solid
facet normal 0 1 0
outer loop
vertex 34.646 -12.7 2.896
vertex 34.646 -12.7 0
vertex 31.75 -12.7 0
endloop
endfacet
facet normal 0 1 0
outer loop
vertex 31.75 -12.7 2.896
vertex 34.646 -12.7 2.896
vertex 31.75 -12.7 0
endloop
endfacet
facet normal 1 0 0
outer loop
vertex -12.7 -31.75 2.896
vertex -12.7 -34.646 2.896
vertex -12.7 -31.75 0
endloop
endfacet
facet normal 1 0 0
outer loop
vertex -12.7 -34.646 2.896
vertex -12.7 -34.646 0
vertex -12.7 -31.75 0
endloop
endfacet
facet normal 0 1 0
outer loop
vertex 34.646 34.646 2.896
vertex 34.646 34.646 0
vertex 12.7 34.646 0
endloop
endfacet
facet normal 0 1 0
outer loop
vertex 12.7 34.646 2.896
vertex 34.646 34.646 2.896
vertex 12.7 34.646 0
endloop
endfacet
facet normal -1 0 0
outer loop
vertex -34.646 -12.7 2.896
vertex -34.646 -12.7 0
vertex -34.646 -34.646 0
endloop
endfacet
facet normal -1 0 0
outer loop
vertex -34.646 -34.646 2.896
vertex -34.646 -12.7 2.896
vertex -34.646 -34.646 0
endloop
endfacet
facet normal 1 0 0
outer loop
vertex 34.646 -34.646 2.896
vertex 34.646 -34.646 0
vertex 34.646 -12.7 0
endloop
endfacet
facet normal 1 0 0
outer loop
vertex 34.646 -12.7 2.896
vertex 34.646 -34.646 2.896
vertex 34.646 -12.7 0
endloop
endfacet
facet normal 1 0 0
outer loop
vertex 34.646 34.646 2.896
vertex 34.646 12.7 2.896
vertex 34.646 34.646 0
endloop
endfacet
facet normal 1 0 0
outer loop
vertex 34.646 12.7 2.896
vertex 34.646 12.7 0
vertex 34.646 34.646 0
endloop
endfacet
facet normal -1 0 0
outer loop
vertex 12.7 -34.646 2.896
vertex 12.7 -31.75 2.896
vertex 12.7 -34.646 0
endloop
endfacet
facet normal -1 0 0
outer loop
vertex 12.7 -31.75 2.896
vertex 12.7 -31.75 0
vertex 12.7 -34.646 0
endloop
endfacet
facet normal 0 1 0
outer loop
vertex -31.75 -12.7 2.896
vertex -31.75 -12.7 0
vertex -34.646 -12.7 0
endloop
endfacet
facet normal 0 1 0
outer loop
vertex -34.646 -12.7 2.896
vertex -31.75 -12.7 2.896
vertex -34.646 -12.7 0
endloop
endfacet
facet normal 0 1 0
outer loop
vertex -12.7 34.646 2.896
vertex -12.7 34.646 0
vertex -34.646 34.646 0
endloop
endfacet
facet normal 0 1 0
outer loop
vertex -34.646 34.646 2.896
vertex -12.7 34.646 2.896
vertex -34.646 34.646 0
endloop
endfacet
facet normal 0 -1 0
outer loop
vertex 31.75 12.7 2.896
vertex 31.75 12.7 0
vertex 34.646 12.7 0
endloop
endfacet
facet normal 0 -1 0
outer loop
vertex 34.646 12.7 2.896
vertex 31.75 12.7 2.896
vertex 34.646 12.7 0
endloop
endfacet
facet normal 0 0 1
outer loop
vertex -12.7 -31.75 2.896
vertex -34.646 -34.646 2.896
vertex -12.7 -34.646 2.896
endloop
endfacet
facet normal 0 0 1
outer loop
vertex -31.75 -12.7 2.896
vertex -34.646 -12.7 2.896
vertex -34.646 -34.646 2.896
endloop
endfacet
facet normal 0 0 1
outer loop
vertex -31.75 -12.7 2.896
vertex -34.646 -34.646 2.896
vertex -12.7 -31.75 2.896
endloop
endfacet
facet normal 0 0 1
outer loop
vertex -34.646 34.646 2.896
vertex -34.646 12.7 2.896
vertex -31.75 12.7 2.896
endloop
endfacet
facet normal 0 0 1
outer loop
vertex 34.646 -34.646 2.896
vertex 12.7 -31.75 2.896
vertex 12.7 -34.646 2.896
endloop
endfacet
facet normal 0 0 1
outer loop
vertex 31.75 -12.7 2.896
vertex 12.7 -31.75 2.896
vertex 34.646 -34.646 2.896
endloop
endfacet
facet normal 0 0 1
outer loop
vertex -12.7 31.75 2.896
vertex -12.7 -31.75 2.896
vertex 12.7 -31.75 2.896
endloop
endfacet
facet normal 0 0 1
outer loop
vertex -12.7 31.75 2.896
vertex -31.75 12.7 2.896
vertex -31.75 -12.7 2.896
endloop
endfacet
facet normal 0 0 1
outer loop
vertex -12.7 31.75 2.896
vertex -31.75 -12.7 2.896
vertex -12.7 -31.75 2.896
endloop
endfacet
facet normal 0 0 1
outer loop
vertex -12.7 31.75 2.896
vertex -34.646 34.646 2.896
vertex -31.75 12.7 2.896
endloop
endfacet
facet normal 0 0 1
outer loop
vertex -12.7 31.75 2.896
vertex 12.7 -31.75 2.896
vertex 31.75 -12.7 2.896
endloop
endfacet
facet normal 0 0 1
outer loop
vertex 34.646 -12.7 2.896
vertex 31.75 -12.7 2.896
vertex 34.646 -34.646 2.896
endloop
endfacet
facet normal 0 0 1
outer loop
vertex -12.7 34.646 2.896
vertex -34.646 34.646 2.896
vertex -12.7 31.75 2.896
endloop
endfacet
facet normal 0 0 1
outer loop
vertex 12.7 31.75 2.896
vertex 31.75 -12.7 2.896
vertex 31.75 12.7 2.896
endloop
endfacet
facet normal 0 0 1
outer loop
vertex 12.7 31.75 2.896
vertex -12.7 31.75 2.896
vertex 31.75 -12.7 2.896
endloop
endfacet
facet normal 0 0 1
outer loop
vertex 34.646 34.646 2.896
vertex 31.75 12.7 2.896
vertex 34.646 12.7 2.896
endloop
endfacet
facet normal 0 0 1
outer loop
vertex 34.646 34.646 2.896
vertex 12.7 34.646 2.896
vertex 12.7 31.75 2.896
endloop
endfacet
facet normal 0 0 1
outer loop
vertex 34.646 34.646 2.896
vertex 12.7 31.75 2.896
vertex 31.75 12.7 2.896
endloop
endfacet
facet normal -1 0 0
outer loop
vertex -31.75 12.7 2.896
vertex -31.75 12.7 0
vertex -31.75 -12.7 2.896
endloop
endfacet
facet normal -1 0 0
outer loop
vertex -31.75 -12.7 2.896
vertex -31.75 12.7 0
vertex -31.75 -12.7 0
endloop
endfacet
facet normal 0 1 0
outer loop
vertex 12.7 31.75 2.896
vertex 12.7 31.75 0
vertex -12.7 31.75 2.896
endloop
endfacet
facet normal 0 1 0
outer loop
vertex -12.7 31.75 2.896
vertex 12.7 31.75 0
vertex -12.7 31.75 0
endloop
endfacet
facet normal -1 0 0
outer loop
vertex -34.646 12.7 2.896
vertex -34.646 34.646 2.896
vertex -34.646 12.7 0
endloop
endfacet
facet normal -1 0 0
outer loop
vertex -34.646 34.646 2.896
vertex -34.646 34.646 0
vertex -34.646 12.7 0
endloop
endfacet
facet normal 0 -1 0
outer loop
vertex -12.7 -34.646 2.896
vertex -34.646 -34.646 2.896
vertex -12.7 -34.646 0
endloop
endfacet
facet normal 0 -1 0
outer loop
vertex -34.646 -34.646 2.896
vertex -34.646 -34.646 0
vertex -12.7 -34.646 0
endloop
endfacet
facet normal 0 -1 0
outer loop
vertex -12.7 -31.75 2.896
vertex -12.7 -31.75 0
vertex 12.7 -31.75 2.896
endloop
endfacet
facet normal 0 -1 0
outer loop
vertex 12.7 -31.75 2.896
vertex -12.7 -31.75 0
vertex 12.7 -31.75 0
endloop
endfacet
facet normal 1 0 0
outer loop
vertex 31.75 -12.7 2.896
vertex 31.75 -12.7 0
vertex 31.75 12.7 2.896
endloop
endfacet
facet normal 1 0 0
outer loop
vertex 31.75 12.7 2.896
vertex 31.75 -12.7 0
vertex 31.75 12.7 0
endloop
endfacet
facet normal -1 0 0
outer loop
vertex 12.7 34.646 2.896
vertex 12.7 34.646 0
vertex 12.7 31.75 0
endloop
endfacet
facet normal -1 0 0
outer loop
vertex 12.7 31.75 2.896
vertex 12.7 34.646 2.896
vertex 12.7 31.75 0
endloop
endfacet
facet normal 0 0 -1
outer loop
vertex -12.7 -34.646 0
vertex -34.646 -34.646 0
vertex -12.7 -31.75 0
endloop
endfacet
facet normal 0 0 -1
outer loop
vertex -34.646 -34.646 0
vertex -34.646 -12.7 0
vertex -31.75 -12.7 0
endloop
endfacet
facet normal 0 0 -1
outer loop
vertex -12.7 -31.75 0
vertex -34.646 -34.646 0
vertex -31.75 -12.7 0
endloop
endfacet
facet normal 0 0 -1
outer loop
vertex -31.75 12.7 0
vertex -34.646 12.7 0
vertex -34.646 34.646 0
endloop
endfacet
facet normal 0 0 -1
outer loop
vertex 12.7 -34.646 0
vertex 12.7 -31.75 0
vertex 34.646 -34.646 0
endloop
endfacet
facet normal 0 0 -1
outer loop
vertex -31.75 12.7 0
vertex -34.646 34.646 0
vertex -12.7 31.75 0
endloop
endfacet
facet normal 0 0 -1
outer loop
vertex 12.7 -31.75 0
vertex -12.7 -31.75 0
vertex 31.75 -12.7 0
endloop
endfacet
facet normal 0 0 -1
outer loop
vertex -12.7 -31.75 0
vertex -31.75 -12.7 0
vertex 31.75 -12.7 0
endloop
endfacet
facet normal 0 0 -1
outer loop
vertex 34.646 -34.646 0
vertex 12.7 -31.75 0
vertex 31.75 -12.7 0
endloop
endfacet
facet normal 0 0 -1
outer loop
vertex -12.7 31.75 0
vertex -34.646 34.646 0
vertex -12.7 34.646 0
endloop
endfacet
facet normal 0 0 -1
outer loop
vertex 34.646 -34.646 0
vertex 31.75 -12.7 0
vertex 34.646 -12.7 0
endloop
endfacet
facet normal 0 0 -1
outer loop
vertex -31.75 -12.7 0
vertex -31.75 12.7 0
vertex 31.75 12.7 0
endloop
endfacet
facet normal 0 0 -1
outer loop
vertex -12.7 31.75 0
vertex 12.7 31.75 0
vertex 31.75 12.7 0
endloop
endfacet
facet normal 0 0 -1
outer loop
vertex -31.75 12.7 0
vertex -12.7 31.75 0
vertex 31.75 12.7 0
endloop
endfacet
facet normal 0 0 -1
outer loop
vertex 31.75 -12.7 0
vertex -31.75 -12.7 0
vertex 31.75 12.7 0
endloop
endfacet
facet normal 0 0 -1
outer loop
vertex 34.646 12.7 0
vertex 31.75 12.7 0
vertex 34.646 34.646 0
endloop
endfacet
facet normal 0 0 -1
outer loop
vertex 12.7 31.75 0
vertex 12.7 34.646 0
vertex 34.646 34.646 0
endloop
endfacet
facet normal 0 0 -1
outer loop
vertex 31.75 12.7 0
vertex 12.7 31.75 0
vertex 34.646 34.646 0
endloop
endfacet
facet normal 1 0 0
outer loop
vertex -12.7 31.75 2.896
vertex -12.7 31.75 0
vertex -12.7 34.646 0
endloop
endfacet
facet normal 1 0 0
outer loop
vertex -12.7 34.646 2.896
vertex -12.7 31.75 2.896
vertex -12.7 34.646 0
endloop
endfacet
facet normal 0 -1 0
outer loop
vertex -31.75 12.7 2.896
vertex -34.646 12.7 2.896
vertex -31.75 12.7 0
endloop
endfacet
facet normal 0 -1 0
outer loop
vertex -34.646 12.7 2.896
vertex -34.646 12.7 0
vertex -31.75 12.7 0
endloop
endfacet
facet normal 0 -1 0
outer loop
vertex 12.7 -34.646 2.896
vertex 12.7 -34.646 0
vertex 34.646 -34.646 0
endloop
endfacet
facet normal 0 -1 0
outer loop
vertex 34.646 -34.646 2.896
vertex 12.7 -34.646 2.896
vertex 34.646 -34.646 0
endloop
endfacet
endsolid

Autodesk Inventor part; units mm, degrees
ref_plane "YZ Plane" through (0, 0, 0) normal (1, 0, 0) x (0, 1, 0)
ref_plane "XZ Plane" through (0, 0, 0) normal (0, 1, 0) x (-1, 0, 0)
ref_plane "XY Plane" through (0, 0, 0) normal (0, 0, 1) x (1, 0, 0)
sketch "Sketch1" plane through (0, 0, 0) normal (0, 0, 1) x (1, 0, 0)
  line L0 (12.7, -31.75) -> (12.7, -34.6456)
  line L1 (12.7, -34.6456) -> (34.6456, -34.6456)
  line L2 (34.6456, -34.6456) -> (34.6456, -12.7)
  line L3 (34.6456, -12.7) -> (31.75, -12.7)
  line L4 (31.75, -12.7) -> (31.75, 12.7)
  line L5 (31.75, 12.7) -> (34.6456, 12.7)
  line L6 (34.6456, 12.7) -> (34.6456, 34.6456)
  line L7 (34.6456, 34.6456) -> (12.7, 34.6456)
  line L8 (12.7, 34.6456) -> (12.7, 31.75)
  line L9 (12.7, 31.75) -> (-12.7, 31.75)
  line L10 (-12.7, 31.75) -> (-12.7, 34.6456)
  line L11 (-12.7, 34.6456) -> (-34.6456, 34.6456)
  line L12 (-34.6456, 34.6456) -> (-34.6456, 12.7)
  line L13 (-34.6456, 12.7) -> (-31.75, 12.7)
  line L14 (-31.75, 12.7) -> (-31.75, -12.7)
  line L15 (-31.75, -12.7) -> (-34.6456, -12.7)
  line L16 (-34.6456, -12.7) -> (-34.6456, -34.6456)
  line L17 (-34.6456, -34.6456) -> (-12.7, -34.6456)
  line L18 (-12.7, -34.6456) -> (-12.7, -31.75)
  line L19 (-12.7, -31.75) -> (12.7, -31.75)
  point P0 (0, 0)
extrude "Extrusion1" add sketch "Sketch1" along normal blind 2.8956
properties part number "outside_box_top_bot" material "Polycarbonate, Clear"
